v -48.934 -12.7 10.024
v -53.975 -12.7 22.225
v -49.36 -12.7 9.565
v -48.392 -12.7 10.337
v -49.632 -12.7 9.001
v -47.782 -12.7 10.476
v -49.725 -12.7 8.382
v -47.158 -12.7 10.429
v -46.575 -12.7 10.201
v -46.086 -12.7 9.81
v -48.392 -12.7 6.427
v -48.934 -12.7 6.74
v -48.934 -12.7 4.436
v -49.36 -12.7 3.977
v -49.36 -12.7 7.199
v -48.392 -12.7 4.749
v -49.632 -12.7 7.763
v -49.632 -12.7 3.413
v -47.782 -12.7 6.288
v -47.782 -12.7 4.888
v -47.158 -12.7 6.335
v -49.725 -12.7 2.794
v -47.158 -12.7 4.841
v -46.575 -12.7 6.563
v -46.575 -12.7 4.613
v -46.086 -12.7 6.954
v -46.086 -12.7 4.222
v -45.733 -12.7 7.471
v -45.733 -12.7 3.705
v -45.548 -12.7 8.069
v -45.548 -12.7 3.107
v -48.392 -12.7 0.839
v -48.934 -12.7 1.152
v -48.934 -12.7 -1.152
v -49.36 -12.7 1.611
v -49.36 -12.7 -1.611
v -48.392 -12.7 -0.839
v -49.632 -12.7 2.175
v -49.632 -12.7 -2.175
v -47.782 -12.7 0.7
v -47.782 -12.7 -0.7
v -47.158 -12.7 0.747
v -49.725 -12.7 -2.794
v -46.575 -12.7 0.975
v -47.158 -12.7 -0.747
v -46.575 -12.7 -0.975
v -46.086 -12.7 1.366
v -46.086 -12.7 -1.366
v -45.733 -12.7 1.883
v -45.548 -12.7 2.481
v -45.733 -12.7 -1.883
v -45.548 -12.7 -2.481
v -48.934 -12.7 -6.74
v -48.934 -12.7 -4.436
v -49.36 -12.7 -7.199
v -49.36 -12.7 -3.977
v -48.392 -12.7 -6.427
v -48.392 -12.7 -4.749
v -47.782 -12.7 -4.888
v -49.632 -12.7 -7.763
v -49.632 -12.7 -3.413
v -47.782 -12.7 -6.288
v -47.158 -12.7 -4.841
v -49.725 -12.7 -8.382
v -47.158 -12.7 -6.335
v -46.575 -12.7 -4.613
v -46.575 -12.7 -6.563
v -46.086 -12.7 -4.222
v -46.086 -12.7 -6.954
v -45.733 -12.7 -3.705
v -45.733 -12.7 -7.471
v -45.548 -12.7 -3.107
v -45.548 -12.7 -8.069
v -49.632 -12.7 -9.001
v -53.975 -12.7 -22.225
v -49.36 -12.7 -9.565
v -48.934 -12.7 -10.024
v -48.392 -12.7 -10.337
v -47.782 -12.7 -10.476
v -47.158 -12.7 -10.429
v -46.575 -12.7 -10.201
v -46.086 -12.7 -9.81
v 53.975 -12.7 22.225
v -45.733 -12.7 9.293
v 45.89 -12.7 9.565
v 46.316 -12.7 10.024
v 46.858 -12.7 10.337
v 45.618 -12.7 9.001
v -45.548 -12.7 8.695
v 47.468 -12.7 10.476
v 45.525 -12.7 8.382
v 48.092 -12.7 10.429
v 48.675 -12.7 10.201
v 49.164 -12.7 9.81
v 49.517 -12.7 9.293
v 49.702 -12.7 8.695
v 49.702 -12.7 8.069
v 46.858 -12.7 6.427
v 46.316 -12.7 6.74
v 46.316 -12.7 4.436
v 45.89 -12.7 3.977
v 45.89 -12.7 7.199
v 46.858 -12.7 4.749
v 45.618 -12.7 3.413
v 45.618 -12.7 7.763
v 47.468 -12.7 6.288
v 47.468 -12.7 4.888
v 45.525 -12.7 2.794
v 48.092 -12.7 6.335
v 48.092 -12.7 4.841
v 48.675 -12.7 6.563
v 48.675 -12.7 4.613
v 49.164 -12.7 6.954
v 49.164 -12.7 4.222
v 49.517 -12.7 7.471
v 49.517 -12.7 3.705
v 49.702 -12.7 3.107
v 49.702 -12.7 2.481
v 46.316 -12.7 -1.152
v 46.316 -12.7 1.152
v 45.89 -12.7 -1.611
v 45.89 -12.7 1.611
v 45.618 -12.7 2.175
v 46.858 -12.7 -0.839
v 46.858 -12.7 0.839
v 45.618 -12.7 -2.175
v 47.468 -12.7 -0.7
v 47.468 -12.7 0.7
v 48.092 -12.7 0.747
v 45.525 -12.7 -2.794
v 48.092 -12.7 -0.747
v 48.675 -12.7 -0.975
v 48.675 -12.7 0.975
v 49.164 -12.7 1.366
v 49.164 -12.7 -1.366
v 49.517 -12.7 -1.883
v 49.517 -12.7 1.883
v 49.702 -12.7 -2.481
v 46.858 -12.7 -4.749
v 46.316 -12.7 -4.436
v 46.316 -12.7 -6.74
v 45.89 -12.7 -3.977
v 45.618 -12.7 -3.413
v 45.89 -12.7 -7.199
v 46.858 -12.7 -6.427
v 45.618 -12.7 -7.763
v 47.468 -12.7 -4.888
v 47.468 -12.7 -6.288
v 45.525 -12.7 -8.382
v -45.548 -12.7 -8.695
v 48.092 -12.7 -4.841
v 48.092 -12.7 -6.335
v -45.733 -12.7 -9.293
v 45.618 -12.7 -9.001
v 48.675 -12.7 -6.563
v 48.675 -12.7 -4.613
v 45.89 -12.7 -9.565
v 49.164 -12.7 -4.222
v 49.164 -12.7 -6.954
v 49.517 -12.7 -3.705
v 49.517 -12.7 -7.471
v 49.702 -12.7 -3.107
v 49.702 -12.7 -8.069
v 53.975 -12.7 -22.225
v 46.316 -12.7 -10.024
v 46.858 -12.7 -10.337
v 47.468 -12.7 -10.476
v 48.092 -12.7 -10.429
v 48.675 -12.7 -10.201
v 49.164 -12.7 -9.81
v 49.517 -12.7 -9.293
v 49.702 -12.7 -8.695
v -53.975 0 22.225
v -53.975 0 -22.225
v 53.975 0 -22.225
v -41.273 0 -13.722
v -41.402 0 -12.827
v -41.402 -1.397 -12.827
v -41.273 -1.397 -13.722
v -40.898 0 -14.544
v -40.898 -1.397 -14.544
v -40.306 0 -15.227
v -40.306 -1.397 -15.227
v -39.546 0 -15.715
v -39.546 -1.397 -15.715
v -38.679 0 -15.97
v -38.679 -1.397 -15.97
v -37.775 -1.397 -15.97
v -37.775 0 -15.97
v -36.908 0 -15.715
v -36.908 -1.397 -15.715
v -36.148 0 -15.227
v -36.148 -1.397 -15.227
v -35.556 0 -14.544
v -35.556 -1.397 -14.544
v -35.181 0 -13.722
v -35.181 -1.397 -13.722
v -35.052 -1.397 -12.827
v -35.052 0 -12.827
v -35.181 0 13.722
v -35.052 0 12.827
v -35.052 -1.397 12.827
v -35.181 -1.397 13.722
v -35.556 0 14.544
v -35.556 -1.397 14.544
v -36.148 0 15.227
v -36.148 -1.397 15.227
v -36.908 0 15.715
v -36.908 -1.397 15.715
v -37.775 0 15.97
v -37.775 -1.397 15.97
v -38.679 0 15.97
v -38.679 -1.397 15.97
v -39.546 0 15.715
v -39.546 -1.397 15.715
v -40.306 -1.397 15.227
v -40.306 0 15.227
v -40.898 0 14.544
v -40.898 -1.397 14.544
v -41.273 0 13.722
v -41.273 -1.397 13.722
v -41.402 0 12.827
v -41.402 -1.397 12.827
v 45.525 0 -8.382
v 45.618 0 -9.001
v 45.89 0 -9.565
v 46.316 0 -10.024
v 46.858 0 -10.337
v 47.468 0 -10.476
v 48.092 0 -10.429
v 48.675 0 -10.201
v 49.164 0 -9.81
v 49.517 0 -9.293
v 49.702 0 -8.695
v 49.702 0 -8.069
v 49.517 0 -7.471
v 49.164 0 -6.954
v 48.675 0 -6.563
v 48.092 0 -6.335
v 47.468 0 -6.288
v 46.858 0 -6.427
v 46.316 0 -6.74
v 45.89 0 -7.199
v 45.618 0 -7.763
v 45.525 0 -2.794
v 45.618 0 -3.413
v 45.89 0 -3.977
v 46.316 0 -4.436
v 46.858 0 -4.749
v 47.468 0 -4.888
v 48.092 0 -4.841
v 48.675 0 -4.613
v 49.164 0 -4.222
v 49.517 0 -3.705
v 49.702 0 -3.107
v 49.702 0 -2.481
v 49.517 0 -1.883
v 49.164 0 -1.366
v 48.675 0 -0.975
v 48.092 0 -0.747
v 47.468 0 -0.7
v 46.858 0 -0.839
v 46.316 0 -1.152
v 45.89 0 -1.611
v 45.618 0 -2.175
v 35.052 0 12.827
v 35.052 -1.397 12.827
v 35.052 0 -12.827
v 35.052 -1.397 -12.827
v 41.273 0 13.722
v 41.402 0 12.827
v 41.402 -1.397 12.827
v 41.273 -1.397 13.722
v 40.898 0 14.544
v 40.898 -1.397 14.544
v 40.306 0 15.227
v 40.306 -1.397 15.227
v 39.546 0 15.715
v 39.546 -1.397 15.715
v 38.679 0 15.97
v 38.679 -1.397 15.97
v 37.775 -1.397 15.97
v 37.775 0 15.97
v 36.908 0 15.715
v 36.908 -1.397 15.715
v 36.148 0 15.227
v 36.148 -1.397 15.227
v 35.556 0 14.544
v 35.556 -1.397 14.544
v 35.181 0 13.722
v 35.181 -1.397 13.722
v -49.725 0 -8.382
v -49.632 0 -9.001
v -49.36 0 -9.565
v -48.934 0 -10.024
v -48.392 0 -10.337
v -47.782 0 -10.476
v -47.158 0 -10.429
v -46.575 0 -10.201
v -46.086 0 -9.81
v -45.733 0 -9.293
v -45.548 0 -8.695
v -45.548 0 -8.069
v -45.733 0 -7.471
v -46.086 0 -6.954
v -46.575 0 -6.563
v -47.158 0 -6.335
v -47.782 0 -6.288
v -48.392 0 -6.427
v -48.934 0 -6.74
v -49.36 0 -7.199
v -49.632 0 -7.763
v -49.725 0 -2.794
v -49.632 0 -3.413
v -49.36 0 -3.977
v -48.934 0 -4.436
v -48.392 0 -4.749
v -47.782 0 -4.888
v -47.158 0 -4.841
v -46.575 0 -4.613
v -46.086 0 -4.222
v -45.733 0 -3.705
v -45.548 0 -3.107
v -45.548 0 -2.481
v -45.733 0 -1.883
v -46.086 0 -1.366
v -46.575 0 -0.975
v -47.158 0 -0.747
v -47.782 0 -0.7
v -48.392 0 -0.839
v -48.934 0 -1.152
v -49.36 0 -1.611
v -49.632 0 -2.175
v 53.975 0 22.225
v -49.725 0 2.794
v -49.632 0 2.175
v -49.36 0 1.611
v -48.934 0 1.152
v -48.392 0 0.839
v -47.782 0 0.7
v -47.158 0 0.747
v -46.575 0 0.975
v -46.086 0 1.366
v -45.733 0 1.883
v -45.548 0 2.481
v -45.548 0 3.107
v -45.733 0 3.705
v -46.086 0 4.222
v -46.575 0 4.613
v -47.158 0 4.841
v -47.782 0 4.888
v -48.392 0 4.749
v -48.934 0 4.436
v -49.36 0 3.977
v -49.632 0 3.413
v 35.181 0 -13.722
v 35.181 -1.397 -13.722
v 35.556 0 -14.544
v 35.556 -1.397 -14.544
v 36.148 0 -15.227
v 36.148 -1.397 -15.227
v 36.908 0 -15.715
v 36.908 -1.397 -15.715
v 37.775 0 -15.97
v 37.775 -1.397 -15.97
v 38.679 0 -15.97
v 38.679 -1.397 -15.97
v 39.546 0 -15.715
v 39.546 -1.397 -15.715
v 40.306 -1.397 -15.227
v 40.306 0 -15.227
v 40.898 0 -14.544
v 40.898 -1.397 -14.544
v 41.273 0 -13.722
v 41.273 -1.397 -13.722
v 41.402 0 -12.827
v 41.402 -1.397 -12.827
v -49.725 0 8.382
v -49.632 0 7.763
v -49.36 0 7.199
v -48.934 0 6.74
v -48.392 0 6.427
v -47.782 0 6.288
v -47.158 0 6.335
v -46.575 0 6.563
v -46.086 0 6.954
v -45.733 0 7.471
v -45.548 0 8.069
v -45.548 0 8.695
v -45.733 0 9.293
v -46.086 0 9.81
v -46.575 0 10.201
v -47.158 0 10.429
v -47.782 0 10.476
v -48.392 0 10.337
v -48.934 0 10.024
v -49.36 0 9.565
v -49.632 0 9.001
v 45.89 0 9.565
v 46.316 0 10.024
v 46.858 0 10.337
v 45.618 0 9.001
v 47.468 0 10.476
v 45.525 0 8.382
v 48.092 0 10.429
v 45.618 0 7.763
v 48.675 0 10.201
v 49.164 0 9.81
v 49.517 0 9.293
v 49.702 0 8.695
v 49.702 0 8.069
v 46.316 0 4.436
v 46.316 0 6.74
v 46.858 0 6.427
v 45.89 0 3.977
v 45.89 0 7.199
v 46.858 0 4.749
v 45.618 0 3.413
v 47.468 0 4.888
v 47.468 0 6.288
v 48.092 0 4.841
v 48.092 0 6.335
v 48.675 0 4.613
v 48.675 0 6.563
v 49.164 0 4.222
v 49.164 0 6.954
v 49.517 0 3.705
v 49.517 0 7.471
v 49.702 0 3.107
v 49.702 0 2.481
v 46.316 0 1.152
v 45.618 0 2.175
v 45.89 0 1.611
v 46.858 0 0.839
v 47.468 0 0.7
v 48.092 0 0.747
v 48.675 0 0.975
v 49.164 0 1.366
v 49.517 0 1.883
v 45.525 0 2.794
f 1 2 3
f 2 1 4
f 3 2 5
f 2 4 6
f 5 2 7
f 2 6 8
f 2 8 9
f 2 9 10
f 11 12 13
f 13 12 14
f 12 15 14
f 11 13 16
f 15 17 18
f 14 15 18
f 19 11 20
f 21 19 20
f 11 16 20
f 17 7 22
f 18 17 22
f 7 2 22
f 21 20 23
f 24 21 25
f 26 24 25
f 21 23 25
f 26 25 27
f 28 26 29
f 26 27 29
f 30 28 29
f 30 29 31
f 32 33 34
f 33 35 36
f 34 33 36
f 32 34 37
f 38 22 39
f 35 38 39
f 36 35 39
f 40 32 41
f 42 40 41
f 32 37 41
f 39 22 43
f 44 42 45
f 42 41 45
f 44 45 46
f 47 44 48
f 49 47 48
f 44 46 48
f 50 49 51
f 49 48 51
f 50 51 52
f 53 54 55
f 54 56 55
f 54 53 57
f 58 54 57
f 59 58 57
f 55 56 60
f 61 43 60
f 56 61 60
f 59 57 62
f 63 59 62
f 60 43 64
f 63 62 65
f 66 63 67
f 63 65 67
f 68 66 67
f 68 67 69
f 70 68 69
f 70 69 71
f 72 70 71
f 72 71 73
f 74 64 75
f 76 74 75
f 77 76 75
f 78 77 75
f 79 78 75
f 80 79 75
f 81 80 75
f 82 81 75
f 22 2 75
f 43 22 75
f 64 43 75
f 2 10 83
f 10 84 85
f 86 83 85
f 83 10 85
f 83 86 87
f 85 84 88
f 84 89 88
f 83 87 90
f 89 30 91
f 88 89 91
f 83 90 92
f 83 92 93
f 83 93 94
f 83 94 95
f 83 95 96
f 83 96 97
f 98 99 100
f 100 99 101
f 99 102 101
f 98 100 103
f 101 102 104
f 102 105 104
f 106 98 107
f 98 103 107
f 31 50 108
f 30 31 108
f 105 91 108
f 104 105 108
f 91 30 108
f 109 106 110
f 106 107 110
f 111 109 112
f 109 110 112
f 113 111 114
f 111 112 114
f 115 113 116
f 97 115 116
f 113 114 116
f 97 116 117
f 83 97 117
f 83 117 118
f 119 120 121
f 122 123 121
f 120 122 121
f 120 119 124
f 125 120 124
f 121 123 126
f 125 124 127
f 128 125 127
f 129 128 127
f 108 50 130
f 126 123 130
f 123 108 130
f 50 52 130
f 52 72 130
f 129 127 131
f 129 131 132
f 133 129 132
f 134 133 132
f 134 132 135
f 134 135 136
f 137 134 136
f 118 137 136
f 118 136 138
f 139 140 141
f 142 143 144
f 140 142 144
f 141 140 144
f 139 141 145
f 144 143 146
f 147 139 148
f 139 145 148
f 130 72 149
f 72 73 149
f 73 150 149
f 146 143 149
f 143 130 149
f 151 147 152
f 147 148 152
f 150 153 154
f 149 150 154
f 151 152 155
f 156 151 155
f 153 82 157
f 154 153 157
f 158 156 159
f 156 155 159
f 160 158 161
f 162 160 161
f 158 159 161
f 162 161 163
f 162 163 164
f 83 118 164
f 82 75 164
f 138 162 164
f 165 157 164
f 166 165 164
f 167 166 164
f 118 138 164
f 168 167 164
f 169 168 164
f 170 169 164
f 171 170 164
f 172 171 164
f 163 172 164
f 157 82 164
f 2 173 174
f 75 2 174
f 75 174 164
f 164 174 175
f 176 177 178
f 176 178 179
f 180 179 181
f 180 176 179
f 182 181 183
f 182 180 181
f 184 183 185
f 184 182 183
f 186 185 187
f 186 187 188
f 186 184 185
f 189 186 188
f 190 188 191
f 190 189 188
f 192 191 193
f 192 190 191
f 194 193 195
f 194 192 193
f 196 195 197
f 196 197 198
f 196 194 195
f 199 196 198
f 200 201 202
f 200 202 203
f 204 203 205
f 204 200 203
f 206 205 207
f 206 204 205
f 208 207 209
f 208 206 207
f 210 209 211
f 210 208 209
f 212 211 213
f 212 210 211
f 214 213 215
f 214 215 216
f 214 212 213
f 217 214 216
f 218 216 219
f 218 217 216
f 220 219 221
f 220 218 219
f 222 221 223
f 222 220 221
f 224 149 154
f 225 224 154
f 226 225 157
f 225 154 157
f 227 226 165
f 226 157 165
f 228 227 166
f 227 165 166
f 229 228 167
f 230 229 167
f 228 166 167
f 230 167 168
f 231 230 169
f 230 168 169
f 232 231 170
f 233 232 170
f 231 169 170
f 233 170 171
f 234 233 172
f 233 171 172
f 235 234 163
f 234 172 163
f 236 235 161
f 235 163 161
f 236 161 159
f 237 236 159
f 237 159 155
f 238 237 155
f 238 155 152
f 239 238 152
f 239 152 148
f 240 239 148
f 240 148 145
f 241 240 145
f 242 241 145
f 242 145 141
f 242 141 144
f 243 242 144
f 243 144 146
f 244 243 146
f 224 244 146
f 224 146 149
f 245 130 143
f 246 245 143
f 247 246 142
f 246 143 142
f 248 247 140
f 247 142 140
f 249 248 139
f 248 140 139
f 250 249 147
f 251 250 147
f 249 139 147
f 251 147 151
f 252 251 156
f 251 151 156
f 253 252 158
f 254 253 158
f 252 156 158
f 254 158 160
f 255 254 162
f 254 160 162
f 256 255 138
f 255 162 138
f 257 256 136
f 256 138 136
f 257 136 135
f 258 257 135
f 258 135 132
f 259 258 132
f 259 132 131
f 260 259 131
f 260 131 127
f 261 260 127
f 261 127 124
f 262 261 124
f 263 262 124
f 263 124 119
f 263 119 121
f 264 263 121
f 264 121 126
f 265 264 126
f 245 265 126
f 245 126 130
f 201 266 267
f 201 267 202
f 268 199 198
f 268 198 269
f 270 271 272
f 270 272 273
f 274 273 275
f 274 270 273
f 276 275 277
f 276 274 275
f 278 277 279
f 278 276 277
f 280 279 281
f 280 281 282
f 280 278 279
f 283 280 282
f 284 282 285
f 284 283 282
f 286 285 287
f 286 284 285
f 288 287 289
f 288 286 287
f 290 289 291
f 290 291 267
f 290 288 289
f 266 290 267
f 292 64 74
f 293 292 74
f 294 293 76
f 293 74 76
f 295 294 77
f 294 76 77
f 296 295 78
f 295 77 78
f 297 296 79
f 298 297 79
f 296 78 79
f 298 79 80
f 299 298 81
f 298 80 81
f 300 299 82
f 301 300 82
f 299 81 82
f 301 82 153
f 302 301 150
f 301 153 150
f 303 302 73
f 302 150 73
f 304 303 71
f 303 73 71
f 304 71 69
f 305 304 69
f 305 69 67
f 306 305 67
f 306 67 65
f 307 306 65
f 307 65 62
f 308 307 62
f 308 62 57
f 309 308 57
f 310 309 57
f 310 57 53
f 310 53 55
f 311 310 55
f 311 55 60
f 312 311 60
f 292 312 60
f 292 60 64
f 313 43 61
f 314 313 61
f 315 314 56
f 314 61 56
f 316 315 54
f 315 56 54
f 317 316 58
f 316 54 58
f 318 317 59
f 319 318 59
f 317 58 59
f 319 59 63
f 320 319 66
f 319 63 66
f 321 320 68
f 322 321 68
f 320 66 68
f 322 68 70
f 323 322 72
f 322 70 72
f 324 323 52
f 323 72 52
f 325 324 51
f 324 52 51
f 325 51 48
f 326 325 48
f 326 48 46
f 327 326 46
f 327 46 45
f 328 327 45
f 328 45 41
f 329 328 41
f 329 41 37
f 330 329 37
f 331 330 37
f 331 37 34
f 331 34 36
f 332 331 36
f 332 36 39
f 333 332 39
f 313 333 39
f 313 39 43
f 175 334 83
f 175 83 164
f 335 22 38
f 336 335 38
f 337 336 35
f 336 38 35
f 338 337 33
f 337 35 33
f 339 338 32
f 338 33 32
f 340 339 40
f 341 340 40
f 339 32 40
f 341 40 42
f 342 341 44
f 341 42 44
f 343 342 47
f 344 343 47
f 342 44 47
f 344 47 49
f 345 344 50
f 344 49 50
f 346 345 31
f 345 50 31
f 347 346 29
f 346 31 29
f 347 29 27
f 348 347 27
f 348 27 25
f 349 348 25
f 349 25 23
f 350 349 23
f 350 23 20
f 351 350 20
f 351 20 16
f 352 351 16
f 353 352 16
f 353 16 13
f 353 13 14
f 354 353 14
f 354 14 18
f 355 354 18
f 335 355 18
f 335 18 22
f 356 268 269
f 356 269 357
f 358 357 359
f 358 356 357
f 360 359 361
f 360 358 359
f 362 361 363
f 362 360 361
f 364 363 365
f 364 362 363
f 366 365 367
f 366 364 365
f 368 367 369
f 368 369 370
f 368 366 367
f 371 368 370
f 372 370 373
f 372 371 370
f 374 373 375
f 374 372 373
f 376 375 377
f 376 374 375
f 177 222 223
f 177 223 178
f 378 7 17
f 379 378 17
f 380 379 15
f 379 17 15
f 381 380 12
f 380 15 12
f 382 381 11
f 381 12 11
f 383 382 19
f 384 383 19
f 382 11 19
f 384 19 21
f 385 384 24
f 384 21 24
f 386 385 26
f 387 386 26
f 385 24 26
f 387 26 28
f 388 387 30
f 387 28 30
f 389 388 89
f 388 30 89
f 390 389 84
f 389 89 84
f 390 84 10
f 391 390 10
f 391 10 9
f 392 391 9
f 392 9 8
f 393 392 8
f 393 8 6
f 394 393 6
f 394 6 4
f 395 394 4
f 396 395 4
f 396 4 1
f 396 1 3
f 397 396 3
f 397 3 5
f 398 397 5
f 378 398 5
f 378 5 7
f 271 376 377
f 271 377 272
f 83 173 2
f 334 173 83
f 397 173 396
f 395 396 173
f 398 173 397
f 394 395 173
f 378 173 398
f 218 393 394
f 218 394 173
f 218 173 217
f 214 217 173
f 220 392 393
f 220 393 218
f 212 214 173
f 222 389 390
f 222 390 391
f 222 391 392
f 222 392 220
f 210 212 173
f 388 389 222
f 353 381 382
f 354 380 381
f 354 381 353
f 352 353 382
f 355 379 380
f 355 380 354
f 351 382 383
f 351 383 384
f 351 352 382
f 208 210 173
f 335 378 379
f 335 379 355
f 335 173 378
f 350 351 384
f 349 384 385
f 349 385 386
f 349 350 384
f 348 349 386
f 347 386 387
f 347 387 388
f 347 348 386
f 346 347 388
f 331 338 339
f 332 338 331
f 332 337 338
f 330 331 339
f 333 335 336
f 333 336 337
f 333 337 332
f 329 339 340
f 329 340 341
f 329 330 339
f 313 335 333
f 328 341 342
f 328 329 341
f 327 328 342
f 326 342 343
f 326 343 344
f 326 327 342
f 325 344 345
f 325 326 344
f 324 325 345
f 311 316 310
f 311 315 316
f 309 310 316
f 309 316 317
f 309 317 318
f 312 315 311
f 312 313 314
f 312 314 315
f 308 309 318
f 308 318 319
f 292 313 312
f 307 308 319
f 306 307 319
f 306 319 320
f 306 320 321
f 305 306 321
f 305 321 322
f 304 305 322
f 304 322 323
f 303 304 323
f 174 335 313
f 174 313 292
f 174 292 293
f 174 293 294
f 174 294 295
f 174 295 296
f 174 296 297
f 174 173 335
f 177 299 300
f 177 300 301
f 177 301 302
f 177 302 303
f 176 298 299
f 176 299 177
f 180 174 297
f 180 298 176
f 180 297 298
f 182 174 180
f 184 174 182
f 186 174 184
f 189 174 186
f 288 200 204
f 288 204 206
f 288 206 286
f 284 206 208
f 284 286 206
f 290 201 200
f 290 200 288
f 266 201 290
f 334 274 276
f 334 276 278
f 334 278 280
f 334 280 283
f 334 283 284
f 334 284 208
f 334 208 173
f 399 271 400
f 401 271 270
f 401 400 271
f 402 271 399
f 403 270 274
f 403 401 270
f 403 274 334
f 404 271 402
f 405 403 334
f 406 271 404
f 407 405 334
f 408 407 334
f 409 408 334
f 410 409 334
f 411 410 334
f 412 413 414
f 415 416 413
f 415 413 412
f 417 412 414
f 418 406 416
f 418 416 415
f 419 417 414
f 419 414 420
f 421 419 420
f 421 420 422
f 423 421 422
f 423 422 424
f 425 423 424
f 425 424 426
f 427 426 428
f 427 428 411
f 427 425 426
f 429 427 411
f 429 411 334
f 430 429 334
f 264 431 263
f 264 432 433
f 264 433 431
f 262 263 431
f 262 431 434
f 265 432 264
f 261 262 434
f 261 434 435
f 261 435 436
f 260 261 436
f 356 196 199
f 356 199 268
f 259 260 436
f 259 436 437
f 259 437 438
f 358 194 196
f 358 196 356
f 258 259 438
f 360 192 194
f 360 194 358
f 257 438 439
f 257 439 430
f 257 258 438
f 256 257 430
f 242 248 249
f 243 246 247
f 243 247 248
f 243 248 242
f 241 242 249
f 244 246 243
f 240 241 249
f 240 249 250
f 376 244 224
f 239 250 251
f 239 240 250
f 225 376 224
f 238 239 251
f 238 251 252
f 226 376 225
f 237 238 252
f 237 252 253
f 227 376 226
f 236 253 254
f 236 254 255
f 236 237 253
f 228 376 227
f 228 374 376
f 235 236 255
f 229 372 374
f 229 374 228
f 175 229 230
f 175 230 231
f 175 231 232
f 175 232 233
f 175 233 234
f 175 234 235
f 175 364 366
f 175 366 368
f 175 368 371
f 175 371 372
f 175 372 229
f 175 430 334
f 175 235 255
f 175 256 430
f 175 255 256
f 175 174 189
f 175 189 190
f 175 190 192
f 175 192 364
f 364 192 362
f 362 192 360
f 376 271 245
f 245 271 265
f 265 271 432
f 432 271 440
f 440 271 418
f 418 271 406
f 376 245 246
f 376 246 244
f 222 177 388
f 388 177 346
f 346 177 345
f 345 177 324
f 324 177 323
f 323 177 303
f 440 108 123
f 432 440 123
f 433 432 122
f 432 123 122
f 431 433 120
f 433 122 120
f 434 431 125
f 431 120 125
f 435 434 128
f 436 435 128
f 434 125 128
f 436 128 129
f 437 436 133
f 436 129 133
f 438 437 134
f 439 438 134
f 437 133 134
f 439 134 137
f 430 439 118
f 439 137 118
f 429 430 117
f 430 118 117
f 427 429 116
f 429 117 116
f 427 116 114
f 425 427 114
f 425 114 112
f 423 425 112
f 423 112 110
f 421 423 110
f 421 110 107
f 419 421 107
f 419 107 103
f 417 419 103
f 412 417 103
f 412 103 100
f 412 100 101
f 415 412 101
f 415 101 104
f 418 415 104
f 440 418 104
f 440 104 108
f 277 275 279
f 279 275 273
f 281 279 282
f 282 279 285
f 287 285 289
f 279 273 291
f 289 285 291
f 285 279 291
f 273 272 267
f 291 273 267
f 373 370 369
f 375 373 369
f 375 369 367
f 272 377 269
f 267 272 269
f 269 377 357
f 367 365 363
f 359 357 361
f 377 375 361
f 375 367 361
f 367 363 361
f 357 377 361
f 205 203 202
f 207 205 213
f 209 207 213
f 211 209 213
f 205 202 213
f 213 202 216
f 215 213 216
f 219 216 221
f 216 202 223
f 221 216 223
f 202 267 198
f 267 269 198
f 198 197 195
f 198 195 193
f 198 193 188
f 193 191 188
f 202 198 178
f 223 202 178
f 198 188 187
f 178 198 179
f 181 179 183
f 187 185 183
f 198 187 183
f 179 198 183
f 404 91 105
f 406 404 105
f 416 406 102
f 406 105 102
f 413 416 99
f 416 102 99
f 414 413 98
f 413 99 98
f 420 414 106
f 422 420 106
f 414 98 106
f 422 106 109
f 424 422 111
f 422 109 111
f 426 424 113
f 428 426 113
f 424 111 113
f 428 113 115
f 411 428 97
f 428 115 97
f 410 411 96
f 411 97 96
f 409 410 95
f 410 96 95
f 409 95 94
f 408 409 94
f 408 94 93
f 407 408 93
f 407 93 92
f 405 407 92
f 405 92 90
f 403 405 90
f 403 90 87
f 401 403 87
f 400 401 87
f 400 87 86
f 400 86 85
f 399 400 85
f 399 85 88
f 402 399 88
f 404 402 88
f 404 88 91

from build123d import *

# Parameters (mm, degrees)
SKETCH1_W             = 107.95
SKETCH1_H             = 44.45
BOSS_EXTRUDE1_DEPTH   = 12.7
CUT_EXTRUDE1_DEPTH    = 1.397
M5X0_8_TAPPED_HOLE1_D = 4.2


with BuildPart() as part:
    # Sketch1 → Boss-Extrude1 (new body)
    with BuildSketch(Plane(origin=(0, 0, 0), x_dir=(1, 0, 0), z_dir=(0, 1, 0))):
        Rectangle(SKETCH1_W, SKETCH1_H)
    extrude(amount=-BOSS_EXTRUDE1_DEPTH)

    # Sketch2 → Cut-Extrude1 (cut)
    with BuildSketch(Plane(origin=(0, 0, 0), x_dir=(1, 0, 0), z_dir=(0, 1, 0))):
        with BuildLine():
            Line((41.402, 12.827), (41.402, -12.827))
            ThreePointArc((41.402, -12.827), (38.227, -16.002), (35.052, -12.827))
            Line((35.052, -12.827), (-35.052, -12.827))
            ThreePointArc((-35.052, -12.827), (-38.227, -16.002), (-41.402, -12.827))
            Line((-41.402, -12.827), (-41.402, 12.827))
            ThreePointArc((-41.402, 12.827), (-38.227, 16.002), (-35.052, 12.827))
            Line((-35.052, 12.827), (35.052, 12.827))
            ThreePointArc((35.052, 12.827), (38.227, 16.002), (41.402, 12.827))
        make_face()
    extrude(amount=-CUT_EXTRUDE1_DEPTH, mode=Mode.SUBTRACT)

    # M5x0.8 Tapped Hole1 (through all)
    with Locations(Plane(origin=(0, 0, 0), x_dir=(1, 0, 0), z_dir=(0, 1, 0))):
        with Locations((-47.625, 8.382), (-47.625, 2.794), (-47.625, -2.794), (-47.625, -8.382), (47.625, -8.382), (47.625, -2.794), (47.625, 2.794), (47.625, 8.382)):
            Hole(M5X0_8_TAPPED_HOLE1_D / 2)


solid = part.part
